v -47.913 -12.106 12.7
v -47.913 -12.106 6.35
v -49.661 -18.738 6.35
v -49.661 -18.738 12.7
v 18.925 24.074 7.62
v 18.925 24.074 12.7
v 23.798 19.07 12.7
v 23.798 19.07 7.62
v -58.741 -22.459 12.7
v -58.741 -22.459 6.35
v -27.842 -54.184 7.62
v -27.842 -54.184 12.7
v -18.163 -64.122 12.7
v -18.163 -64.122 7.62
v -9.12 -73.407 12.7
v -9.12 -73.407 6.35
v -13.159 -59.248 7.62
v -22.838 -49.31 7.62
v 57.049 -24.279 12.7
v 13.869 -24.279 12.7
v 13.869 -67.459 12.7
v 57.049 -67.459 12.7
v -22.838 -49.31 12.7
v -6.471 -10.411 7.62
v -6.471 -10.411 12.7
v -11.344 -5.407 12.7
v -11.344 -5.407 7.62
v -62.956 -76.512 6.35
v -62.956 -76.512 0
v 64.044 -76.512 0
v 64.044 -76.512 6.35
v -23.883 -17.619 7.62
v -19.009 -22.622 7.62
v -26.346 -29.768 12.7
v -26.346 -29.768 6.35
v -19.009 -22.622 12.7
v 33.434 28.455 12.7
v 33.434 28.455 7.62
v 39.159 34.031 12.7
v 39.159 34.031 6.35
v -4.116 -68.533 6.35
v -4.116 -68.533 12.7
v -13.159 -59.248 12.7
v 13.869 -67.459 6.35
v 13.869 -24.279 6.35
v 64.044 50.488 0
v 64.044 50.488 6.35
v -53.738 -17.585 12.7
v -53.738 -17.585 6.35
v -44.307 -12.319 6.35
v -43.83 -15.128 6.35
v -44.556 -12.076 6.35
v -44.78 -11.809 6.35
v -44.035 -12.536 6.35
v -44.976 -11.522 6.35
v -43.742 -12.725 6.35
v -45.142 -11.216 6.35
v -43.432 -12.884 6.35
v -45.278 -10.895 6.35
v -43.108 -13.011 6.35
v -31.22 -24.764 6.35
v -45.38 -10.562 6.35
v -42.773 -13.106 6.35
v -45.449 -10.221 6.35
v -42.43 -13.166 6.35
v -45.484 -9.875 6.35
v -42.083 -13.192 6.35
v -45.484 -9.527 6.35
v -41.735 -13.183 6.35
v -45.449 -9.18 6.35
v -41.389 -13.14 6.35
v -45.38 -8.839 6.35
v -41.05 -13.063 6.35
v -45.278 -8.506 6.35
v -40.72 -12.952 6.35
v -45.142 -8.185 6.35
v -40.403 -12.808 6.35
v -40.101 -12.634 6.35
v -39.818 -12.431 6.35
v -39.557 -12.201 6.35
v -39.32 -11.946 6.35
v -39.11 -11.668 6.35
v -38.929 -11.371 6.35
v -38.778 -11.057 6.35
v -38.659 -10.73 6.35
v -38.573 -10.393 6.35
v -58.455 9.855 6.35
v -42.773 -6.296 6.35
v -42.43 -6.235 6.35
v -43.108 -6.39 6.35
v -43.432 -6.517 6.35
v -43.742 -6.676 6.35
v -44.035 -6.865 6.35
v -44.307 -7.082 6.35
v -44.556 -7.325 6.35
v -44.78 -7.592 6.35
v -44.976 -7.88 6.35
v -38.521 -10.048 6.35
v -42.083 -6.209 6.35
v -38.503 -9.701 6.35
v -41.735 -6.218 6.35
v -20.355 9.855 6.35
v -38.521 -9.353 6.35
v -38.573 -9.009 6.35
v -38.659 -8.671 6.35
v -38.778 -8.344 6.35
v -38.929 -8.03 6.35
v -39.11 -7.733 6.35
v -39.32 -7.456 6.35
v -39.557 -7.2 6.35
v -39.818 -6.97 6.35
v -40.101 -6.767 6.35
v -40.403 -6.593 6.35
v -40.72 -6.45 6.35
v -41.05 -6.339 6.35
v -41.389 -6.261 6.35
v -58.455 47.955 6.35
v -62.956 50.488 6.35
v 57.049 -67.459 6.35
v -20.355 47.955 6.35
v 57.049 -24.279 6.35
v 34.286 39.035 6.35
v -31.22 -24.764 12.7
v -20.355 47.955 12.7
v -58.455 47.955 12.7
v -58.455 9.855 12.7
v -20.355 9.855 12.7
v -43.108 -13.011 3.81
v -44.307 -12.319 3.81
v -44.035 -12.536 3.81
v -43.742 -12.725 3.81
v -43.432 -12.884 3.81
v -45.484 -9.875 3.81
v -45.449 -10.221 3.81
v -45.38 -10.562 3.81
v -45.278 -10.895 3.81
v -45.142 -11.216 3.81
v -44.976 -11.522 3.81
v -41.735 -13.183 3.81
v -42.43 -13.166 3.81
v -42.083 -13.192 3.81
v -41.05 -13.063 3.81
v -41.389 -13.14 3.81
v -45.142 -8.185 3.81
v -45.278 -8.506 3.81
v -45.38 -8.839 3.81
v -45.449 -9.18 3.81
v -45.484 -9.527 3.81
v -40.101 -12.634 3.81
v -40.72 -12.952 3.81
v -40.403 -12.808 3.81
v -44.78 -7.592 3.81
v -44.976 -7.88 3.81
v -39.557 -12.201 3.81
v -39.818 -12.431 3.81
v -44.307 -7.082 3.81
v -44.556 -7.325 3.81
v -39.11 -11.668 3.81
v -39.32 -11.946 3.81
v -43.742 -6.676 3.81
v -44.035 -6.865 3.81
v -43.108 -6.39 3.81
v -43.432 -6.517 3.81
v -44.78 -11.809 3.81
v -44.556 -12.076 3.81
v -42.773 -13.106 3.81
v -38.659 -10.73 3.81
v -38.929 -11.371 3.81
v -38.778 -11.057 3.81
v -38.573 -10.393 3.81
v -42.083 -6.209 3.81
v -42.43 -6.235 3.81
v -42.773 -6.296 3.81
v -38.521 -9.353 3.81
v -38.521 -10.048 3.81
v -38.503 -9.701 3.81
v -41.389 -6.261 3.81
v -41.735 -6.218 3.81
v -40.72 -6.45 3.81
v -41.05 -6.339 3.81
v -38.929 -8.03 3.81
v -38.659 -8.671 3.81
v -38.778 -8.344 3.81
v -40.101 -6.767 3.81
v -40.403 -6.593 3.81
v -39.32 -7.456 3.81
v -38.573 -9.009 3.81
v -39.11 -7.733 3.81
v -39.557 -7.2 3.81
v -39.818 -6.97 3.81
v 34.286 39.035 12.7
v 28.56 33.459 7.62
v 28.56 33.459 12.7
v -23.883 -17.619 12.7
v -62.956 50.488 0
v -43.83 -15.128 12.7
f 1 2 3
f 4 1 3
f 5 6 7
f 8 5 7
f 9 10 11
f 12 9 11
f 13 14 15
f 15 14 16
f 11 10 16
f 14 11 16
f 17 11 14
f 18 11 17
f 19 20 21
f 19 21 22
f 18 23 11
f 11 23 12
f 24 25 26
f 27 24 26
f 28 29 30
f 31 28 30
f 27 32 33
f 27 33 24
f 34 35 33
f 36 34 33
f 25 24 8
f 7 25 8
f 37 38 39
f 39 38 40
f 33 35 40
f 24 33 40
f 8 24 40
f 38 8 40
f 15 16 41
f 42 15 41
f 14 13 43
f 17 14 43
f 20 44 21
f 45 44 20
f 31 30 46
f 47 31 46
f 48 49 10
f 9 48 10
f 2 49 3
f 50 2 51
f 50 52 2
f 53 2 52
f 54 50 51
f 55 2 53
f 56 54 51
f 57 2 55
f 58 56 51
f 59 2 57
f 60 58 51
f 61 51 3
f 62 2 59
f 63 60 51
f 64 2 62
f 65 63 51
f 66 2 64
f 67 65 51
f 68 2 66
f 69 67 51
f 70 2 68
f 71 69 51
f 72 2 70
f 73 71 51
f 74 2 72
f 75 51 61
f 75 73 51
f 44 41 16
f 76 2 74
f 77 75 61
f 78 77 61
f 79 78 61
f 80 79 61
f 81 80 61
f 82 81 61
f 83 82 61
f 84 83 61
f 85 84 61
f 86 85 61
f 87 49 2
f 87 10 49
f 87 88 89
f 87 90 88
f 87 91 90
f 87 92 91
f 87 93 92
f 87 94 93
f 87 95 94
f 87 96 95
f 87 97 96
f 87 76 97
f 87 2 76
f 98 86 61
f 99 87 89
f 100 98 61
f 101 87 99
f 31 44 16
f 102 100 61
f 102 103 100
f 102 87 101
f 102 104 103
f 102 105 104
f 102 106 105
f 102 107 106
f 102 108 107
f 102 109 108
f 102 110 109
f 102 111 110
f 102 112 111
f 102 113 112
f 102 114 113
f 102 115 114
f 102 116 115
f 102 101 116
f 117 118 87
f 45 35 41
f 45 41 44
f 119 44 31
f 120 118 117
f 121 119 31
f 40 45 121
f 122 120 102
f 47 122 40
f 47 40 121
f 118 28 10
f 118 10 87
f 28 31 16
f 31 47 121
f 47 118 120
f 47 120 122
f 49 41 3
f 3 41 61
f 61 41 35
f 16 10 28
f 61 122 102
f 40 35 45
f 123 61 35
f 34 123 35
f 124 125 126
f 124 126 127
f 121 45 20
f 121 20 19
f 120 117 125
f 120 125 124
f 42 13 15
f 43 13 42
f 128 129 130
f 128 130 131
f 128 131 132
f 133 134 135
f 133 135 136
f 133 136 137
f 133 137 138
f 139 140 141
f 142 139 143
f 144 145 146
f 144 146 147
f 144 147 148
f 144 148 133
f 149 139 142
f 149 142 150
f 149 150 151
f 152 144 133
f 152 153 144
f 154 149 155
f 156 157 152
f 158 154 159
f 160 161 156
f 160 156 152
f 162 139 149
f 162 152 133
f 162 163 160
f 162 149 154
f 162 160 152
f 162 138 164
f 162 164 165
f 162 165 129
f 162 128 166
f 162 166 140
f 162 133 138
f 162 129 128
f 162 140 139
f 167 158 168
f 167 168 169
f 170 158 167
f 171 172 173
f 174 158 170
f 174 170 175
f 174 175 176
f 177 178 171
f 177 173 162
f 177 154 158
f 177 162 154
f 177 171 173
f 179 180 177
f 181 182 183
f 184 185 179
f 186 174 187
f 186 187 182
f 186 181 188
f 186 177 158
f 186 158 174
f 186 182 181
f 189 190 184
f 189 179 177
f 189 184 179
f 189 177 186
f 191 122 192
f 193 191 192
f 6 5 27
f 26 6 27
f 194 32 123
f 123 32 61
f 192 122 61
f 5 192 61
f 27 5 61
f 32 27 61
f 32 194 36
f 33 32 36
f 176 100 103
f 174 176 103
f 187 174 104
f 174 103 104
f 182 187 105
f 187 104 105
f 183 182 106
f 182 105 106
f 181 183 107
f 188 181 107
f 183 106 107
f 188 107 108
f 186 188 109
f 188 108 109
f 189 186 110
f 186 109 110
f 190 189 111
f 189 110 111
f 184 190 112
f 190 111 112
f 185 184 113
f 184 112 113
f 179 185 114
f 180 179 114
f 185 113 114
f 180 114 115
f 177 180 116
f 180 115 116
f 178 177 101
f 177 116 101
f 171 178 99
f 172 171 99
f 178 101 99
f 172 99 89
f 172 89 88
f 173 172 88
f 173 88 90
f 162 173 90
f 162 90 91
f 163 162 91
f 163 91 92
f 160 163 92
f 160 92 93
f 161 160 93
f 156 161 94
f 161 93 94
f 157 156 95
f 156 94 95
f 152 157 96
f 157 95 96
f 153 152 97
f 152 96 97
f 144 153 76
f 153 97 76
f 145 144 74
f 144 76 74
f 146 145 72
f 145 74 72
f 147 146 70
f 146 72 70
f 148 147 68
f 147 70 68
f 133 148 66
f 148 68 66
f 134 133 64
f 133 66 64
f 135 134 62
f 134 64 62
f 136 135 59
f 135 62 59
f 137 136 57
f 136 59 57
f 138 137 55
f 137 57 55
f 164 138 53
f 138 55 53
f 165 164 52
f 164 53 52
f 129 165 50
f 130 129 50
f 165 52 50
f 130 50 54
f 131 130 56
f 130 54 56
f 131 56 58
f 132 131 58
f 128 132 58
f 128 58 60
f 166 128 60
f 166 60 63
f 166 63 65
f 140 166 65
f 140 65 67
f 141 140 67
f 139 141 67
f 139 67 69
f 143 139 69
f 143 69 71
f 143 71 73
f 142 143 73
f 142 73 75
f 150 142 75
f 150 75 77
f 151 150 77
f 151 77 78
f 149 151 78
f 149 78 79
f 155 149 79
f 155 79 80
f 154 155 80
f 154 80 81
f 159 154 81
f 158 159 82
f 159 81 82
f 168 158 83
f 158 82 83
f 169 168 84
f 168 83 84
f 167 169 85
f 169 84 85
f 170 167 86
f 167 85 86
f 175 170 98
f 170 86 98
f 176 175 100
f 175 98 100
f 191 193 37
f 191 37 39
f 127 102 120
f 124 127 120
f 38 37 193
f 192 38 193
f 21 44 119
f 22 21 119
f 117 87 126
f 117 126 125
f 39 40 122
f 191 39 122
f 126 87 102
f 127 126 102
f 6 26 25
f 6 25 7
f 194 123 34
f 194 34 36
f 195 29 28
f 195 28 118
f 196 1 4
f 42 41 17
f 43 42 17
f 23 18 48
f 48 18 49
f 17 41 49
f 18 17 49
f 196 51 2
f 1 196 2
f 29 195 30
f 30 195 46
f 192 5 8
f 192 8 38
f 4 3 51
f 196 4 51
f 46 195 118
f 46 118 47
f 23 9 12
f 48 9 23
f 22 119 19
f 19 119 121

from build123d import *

# Parameters (mm, degrees)
F0_W      = 127
F0_H      = 127
F1_DEPTH  = 6.35
F3_DEPTH  = 6.35
F5_DEPTH  = 5.08
F6_W      = 43.18
F6_H      = 43.18
F7_DEPTH  = 6.35
F9_DEPTH  = 6.35
F11_DEPTH = 5.08
F12_W     = 38.1
F12_H     = 38.1
F13_DEPTH = 6.35
F14_R     = 3.4925
F15_DEPTH = 2.54
F17_DEPTH = 6.35


with BuildPart() as f1:
    # F0 (on Top) → F1 (new body)
    with BuildSketch(Plane.XY):
        with Locations((0.5442854017, -13.0122138653)):
            Rectangle(F0_W, F0_H)
    extrude(amount=F1_DEPTH)

    # F2 (on face) → F3 (join)
    with BuildSketch(Plane.XY.offset(6.35)):
        Polygon((-53.7375879309, -17.5850009601), (-58.7414534923, -22.4585576124), (-9.1197857594, -73.4070069648), (-4.115920198, -68.5334503124), align=None)
    extrude(amount=F3_DEPTH)

    # F4 (on face) → F5 (cut)
    with BuildSketch(Plane.XY.offset(12.7)):
        Polygon((-22.838354329, -49.3104166932), (-27.8422198903, -54.1839733455), (-18.1633084233, -64.1216790535), (-13.1594428619, -59.2481224011), align=None)
    extrude(amount=-F5_DEPTH, mode=Mode.SUBTRACT)

    # F6 (on face) → F7 (join)
    with BuildSketch(Plane.XY.offset(6.35)):
        with Locations((35.4591379873, -45.8693522716)):
            Rectangle(F6_W, F6_H)
    extrude(amount=F7_DEPTH)

    # F8 (on face) → F9 (join)
    with BuildSketch(Plane.XY.offset(6.35)):
        Polygon((34.285597458, 39.0348099981), (-31.2195517093, -24.764477087), (-26.345995057, -29.7683426483), (39.1591541104, 34.0309444367), align=None)
    extrude(amount=F9_DEPTH)

    # F10 (on face) → F11 (cut)
    with BuildSketch(Plane.XY.offset(12.7)):
        Polygon((-11.3444998697, -5.4070043651), (-23.882560582, -17.618553305), (-19.0090039296, -22.6224188664), (-6.4709432174, -10.4108699265), align=None)
        Polygon((28.5604737616, 33.4587779618), (18.924622147, 24.0738598097), (23.7981787993, 19.0699942484), (33.434030414, 28.4549124004), align=None)
    extrude(amount=-F11_DEPTH, mode=Mode.SUBTRACT)

    # F12 (on face) → F13 (join)
    with BuildSketch(Plane.XY.offset(6.35)):
        with Locations((-39.4052062184, 28.9046873478)):
            Rectangle(F12_W, F12_H)
    extrude(amount=F13_DEPTH)

    # F14 (on face) → F15 (cut)
    with BuildSketch(Plane.XY.offset(6.35)):
        with Locations((-41.9958606362, -9.7006224096)):
            Circle(F14_R)
    extrude(amount=-F15_DEPTH, mode=Mode.SUBTRACT)

    # F16 (on face) → F17 (join)
    with BuildSketch(Plane.XY.offset(6.35)):
        Polygon((-43.8297687504, -15.1278137338), (-47.9132530889, -12.1059673352), (-49.6608870253, -18.737553844), align=None)
    extrude(amount=F17_DEPTH)


solid = f1.part
